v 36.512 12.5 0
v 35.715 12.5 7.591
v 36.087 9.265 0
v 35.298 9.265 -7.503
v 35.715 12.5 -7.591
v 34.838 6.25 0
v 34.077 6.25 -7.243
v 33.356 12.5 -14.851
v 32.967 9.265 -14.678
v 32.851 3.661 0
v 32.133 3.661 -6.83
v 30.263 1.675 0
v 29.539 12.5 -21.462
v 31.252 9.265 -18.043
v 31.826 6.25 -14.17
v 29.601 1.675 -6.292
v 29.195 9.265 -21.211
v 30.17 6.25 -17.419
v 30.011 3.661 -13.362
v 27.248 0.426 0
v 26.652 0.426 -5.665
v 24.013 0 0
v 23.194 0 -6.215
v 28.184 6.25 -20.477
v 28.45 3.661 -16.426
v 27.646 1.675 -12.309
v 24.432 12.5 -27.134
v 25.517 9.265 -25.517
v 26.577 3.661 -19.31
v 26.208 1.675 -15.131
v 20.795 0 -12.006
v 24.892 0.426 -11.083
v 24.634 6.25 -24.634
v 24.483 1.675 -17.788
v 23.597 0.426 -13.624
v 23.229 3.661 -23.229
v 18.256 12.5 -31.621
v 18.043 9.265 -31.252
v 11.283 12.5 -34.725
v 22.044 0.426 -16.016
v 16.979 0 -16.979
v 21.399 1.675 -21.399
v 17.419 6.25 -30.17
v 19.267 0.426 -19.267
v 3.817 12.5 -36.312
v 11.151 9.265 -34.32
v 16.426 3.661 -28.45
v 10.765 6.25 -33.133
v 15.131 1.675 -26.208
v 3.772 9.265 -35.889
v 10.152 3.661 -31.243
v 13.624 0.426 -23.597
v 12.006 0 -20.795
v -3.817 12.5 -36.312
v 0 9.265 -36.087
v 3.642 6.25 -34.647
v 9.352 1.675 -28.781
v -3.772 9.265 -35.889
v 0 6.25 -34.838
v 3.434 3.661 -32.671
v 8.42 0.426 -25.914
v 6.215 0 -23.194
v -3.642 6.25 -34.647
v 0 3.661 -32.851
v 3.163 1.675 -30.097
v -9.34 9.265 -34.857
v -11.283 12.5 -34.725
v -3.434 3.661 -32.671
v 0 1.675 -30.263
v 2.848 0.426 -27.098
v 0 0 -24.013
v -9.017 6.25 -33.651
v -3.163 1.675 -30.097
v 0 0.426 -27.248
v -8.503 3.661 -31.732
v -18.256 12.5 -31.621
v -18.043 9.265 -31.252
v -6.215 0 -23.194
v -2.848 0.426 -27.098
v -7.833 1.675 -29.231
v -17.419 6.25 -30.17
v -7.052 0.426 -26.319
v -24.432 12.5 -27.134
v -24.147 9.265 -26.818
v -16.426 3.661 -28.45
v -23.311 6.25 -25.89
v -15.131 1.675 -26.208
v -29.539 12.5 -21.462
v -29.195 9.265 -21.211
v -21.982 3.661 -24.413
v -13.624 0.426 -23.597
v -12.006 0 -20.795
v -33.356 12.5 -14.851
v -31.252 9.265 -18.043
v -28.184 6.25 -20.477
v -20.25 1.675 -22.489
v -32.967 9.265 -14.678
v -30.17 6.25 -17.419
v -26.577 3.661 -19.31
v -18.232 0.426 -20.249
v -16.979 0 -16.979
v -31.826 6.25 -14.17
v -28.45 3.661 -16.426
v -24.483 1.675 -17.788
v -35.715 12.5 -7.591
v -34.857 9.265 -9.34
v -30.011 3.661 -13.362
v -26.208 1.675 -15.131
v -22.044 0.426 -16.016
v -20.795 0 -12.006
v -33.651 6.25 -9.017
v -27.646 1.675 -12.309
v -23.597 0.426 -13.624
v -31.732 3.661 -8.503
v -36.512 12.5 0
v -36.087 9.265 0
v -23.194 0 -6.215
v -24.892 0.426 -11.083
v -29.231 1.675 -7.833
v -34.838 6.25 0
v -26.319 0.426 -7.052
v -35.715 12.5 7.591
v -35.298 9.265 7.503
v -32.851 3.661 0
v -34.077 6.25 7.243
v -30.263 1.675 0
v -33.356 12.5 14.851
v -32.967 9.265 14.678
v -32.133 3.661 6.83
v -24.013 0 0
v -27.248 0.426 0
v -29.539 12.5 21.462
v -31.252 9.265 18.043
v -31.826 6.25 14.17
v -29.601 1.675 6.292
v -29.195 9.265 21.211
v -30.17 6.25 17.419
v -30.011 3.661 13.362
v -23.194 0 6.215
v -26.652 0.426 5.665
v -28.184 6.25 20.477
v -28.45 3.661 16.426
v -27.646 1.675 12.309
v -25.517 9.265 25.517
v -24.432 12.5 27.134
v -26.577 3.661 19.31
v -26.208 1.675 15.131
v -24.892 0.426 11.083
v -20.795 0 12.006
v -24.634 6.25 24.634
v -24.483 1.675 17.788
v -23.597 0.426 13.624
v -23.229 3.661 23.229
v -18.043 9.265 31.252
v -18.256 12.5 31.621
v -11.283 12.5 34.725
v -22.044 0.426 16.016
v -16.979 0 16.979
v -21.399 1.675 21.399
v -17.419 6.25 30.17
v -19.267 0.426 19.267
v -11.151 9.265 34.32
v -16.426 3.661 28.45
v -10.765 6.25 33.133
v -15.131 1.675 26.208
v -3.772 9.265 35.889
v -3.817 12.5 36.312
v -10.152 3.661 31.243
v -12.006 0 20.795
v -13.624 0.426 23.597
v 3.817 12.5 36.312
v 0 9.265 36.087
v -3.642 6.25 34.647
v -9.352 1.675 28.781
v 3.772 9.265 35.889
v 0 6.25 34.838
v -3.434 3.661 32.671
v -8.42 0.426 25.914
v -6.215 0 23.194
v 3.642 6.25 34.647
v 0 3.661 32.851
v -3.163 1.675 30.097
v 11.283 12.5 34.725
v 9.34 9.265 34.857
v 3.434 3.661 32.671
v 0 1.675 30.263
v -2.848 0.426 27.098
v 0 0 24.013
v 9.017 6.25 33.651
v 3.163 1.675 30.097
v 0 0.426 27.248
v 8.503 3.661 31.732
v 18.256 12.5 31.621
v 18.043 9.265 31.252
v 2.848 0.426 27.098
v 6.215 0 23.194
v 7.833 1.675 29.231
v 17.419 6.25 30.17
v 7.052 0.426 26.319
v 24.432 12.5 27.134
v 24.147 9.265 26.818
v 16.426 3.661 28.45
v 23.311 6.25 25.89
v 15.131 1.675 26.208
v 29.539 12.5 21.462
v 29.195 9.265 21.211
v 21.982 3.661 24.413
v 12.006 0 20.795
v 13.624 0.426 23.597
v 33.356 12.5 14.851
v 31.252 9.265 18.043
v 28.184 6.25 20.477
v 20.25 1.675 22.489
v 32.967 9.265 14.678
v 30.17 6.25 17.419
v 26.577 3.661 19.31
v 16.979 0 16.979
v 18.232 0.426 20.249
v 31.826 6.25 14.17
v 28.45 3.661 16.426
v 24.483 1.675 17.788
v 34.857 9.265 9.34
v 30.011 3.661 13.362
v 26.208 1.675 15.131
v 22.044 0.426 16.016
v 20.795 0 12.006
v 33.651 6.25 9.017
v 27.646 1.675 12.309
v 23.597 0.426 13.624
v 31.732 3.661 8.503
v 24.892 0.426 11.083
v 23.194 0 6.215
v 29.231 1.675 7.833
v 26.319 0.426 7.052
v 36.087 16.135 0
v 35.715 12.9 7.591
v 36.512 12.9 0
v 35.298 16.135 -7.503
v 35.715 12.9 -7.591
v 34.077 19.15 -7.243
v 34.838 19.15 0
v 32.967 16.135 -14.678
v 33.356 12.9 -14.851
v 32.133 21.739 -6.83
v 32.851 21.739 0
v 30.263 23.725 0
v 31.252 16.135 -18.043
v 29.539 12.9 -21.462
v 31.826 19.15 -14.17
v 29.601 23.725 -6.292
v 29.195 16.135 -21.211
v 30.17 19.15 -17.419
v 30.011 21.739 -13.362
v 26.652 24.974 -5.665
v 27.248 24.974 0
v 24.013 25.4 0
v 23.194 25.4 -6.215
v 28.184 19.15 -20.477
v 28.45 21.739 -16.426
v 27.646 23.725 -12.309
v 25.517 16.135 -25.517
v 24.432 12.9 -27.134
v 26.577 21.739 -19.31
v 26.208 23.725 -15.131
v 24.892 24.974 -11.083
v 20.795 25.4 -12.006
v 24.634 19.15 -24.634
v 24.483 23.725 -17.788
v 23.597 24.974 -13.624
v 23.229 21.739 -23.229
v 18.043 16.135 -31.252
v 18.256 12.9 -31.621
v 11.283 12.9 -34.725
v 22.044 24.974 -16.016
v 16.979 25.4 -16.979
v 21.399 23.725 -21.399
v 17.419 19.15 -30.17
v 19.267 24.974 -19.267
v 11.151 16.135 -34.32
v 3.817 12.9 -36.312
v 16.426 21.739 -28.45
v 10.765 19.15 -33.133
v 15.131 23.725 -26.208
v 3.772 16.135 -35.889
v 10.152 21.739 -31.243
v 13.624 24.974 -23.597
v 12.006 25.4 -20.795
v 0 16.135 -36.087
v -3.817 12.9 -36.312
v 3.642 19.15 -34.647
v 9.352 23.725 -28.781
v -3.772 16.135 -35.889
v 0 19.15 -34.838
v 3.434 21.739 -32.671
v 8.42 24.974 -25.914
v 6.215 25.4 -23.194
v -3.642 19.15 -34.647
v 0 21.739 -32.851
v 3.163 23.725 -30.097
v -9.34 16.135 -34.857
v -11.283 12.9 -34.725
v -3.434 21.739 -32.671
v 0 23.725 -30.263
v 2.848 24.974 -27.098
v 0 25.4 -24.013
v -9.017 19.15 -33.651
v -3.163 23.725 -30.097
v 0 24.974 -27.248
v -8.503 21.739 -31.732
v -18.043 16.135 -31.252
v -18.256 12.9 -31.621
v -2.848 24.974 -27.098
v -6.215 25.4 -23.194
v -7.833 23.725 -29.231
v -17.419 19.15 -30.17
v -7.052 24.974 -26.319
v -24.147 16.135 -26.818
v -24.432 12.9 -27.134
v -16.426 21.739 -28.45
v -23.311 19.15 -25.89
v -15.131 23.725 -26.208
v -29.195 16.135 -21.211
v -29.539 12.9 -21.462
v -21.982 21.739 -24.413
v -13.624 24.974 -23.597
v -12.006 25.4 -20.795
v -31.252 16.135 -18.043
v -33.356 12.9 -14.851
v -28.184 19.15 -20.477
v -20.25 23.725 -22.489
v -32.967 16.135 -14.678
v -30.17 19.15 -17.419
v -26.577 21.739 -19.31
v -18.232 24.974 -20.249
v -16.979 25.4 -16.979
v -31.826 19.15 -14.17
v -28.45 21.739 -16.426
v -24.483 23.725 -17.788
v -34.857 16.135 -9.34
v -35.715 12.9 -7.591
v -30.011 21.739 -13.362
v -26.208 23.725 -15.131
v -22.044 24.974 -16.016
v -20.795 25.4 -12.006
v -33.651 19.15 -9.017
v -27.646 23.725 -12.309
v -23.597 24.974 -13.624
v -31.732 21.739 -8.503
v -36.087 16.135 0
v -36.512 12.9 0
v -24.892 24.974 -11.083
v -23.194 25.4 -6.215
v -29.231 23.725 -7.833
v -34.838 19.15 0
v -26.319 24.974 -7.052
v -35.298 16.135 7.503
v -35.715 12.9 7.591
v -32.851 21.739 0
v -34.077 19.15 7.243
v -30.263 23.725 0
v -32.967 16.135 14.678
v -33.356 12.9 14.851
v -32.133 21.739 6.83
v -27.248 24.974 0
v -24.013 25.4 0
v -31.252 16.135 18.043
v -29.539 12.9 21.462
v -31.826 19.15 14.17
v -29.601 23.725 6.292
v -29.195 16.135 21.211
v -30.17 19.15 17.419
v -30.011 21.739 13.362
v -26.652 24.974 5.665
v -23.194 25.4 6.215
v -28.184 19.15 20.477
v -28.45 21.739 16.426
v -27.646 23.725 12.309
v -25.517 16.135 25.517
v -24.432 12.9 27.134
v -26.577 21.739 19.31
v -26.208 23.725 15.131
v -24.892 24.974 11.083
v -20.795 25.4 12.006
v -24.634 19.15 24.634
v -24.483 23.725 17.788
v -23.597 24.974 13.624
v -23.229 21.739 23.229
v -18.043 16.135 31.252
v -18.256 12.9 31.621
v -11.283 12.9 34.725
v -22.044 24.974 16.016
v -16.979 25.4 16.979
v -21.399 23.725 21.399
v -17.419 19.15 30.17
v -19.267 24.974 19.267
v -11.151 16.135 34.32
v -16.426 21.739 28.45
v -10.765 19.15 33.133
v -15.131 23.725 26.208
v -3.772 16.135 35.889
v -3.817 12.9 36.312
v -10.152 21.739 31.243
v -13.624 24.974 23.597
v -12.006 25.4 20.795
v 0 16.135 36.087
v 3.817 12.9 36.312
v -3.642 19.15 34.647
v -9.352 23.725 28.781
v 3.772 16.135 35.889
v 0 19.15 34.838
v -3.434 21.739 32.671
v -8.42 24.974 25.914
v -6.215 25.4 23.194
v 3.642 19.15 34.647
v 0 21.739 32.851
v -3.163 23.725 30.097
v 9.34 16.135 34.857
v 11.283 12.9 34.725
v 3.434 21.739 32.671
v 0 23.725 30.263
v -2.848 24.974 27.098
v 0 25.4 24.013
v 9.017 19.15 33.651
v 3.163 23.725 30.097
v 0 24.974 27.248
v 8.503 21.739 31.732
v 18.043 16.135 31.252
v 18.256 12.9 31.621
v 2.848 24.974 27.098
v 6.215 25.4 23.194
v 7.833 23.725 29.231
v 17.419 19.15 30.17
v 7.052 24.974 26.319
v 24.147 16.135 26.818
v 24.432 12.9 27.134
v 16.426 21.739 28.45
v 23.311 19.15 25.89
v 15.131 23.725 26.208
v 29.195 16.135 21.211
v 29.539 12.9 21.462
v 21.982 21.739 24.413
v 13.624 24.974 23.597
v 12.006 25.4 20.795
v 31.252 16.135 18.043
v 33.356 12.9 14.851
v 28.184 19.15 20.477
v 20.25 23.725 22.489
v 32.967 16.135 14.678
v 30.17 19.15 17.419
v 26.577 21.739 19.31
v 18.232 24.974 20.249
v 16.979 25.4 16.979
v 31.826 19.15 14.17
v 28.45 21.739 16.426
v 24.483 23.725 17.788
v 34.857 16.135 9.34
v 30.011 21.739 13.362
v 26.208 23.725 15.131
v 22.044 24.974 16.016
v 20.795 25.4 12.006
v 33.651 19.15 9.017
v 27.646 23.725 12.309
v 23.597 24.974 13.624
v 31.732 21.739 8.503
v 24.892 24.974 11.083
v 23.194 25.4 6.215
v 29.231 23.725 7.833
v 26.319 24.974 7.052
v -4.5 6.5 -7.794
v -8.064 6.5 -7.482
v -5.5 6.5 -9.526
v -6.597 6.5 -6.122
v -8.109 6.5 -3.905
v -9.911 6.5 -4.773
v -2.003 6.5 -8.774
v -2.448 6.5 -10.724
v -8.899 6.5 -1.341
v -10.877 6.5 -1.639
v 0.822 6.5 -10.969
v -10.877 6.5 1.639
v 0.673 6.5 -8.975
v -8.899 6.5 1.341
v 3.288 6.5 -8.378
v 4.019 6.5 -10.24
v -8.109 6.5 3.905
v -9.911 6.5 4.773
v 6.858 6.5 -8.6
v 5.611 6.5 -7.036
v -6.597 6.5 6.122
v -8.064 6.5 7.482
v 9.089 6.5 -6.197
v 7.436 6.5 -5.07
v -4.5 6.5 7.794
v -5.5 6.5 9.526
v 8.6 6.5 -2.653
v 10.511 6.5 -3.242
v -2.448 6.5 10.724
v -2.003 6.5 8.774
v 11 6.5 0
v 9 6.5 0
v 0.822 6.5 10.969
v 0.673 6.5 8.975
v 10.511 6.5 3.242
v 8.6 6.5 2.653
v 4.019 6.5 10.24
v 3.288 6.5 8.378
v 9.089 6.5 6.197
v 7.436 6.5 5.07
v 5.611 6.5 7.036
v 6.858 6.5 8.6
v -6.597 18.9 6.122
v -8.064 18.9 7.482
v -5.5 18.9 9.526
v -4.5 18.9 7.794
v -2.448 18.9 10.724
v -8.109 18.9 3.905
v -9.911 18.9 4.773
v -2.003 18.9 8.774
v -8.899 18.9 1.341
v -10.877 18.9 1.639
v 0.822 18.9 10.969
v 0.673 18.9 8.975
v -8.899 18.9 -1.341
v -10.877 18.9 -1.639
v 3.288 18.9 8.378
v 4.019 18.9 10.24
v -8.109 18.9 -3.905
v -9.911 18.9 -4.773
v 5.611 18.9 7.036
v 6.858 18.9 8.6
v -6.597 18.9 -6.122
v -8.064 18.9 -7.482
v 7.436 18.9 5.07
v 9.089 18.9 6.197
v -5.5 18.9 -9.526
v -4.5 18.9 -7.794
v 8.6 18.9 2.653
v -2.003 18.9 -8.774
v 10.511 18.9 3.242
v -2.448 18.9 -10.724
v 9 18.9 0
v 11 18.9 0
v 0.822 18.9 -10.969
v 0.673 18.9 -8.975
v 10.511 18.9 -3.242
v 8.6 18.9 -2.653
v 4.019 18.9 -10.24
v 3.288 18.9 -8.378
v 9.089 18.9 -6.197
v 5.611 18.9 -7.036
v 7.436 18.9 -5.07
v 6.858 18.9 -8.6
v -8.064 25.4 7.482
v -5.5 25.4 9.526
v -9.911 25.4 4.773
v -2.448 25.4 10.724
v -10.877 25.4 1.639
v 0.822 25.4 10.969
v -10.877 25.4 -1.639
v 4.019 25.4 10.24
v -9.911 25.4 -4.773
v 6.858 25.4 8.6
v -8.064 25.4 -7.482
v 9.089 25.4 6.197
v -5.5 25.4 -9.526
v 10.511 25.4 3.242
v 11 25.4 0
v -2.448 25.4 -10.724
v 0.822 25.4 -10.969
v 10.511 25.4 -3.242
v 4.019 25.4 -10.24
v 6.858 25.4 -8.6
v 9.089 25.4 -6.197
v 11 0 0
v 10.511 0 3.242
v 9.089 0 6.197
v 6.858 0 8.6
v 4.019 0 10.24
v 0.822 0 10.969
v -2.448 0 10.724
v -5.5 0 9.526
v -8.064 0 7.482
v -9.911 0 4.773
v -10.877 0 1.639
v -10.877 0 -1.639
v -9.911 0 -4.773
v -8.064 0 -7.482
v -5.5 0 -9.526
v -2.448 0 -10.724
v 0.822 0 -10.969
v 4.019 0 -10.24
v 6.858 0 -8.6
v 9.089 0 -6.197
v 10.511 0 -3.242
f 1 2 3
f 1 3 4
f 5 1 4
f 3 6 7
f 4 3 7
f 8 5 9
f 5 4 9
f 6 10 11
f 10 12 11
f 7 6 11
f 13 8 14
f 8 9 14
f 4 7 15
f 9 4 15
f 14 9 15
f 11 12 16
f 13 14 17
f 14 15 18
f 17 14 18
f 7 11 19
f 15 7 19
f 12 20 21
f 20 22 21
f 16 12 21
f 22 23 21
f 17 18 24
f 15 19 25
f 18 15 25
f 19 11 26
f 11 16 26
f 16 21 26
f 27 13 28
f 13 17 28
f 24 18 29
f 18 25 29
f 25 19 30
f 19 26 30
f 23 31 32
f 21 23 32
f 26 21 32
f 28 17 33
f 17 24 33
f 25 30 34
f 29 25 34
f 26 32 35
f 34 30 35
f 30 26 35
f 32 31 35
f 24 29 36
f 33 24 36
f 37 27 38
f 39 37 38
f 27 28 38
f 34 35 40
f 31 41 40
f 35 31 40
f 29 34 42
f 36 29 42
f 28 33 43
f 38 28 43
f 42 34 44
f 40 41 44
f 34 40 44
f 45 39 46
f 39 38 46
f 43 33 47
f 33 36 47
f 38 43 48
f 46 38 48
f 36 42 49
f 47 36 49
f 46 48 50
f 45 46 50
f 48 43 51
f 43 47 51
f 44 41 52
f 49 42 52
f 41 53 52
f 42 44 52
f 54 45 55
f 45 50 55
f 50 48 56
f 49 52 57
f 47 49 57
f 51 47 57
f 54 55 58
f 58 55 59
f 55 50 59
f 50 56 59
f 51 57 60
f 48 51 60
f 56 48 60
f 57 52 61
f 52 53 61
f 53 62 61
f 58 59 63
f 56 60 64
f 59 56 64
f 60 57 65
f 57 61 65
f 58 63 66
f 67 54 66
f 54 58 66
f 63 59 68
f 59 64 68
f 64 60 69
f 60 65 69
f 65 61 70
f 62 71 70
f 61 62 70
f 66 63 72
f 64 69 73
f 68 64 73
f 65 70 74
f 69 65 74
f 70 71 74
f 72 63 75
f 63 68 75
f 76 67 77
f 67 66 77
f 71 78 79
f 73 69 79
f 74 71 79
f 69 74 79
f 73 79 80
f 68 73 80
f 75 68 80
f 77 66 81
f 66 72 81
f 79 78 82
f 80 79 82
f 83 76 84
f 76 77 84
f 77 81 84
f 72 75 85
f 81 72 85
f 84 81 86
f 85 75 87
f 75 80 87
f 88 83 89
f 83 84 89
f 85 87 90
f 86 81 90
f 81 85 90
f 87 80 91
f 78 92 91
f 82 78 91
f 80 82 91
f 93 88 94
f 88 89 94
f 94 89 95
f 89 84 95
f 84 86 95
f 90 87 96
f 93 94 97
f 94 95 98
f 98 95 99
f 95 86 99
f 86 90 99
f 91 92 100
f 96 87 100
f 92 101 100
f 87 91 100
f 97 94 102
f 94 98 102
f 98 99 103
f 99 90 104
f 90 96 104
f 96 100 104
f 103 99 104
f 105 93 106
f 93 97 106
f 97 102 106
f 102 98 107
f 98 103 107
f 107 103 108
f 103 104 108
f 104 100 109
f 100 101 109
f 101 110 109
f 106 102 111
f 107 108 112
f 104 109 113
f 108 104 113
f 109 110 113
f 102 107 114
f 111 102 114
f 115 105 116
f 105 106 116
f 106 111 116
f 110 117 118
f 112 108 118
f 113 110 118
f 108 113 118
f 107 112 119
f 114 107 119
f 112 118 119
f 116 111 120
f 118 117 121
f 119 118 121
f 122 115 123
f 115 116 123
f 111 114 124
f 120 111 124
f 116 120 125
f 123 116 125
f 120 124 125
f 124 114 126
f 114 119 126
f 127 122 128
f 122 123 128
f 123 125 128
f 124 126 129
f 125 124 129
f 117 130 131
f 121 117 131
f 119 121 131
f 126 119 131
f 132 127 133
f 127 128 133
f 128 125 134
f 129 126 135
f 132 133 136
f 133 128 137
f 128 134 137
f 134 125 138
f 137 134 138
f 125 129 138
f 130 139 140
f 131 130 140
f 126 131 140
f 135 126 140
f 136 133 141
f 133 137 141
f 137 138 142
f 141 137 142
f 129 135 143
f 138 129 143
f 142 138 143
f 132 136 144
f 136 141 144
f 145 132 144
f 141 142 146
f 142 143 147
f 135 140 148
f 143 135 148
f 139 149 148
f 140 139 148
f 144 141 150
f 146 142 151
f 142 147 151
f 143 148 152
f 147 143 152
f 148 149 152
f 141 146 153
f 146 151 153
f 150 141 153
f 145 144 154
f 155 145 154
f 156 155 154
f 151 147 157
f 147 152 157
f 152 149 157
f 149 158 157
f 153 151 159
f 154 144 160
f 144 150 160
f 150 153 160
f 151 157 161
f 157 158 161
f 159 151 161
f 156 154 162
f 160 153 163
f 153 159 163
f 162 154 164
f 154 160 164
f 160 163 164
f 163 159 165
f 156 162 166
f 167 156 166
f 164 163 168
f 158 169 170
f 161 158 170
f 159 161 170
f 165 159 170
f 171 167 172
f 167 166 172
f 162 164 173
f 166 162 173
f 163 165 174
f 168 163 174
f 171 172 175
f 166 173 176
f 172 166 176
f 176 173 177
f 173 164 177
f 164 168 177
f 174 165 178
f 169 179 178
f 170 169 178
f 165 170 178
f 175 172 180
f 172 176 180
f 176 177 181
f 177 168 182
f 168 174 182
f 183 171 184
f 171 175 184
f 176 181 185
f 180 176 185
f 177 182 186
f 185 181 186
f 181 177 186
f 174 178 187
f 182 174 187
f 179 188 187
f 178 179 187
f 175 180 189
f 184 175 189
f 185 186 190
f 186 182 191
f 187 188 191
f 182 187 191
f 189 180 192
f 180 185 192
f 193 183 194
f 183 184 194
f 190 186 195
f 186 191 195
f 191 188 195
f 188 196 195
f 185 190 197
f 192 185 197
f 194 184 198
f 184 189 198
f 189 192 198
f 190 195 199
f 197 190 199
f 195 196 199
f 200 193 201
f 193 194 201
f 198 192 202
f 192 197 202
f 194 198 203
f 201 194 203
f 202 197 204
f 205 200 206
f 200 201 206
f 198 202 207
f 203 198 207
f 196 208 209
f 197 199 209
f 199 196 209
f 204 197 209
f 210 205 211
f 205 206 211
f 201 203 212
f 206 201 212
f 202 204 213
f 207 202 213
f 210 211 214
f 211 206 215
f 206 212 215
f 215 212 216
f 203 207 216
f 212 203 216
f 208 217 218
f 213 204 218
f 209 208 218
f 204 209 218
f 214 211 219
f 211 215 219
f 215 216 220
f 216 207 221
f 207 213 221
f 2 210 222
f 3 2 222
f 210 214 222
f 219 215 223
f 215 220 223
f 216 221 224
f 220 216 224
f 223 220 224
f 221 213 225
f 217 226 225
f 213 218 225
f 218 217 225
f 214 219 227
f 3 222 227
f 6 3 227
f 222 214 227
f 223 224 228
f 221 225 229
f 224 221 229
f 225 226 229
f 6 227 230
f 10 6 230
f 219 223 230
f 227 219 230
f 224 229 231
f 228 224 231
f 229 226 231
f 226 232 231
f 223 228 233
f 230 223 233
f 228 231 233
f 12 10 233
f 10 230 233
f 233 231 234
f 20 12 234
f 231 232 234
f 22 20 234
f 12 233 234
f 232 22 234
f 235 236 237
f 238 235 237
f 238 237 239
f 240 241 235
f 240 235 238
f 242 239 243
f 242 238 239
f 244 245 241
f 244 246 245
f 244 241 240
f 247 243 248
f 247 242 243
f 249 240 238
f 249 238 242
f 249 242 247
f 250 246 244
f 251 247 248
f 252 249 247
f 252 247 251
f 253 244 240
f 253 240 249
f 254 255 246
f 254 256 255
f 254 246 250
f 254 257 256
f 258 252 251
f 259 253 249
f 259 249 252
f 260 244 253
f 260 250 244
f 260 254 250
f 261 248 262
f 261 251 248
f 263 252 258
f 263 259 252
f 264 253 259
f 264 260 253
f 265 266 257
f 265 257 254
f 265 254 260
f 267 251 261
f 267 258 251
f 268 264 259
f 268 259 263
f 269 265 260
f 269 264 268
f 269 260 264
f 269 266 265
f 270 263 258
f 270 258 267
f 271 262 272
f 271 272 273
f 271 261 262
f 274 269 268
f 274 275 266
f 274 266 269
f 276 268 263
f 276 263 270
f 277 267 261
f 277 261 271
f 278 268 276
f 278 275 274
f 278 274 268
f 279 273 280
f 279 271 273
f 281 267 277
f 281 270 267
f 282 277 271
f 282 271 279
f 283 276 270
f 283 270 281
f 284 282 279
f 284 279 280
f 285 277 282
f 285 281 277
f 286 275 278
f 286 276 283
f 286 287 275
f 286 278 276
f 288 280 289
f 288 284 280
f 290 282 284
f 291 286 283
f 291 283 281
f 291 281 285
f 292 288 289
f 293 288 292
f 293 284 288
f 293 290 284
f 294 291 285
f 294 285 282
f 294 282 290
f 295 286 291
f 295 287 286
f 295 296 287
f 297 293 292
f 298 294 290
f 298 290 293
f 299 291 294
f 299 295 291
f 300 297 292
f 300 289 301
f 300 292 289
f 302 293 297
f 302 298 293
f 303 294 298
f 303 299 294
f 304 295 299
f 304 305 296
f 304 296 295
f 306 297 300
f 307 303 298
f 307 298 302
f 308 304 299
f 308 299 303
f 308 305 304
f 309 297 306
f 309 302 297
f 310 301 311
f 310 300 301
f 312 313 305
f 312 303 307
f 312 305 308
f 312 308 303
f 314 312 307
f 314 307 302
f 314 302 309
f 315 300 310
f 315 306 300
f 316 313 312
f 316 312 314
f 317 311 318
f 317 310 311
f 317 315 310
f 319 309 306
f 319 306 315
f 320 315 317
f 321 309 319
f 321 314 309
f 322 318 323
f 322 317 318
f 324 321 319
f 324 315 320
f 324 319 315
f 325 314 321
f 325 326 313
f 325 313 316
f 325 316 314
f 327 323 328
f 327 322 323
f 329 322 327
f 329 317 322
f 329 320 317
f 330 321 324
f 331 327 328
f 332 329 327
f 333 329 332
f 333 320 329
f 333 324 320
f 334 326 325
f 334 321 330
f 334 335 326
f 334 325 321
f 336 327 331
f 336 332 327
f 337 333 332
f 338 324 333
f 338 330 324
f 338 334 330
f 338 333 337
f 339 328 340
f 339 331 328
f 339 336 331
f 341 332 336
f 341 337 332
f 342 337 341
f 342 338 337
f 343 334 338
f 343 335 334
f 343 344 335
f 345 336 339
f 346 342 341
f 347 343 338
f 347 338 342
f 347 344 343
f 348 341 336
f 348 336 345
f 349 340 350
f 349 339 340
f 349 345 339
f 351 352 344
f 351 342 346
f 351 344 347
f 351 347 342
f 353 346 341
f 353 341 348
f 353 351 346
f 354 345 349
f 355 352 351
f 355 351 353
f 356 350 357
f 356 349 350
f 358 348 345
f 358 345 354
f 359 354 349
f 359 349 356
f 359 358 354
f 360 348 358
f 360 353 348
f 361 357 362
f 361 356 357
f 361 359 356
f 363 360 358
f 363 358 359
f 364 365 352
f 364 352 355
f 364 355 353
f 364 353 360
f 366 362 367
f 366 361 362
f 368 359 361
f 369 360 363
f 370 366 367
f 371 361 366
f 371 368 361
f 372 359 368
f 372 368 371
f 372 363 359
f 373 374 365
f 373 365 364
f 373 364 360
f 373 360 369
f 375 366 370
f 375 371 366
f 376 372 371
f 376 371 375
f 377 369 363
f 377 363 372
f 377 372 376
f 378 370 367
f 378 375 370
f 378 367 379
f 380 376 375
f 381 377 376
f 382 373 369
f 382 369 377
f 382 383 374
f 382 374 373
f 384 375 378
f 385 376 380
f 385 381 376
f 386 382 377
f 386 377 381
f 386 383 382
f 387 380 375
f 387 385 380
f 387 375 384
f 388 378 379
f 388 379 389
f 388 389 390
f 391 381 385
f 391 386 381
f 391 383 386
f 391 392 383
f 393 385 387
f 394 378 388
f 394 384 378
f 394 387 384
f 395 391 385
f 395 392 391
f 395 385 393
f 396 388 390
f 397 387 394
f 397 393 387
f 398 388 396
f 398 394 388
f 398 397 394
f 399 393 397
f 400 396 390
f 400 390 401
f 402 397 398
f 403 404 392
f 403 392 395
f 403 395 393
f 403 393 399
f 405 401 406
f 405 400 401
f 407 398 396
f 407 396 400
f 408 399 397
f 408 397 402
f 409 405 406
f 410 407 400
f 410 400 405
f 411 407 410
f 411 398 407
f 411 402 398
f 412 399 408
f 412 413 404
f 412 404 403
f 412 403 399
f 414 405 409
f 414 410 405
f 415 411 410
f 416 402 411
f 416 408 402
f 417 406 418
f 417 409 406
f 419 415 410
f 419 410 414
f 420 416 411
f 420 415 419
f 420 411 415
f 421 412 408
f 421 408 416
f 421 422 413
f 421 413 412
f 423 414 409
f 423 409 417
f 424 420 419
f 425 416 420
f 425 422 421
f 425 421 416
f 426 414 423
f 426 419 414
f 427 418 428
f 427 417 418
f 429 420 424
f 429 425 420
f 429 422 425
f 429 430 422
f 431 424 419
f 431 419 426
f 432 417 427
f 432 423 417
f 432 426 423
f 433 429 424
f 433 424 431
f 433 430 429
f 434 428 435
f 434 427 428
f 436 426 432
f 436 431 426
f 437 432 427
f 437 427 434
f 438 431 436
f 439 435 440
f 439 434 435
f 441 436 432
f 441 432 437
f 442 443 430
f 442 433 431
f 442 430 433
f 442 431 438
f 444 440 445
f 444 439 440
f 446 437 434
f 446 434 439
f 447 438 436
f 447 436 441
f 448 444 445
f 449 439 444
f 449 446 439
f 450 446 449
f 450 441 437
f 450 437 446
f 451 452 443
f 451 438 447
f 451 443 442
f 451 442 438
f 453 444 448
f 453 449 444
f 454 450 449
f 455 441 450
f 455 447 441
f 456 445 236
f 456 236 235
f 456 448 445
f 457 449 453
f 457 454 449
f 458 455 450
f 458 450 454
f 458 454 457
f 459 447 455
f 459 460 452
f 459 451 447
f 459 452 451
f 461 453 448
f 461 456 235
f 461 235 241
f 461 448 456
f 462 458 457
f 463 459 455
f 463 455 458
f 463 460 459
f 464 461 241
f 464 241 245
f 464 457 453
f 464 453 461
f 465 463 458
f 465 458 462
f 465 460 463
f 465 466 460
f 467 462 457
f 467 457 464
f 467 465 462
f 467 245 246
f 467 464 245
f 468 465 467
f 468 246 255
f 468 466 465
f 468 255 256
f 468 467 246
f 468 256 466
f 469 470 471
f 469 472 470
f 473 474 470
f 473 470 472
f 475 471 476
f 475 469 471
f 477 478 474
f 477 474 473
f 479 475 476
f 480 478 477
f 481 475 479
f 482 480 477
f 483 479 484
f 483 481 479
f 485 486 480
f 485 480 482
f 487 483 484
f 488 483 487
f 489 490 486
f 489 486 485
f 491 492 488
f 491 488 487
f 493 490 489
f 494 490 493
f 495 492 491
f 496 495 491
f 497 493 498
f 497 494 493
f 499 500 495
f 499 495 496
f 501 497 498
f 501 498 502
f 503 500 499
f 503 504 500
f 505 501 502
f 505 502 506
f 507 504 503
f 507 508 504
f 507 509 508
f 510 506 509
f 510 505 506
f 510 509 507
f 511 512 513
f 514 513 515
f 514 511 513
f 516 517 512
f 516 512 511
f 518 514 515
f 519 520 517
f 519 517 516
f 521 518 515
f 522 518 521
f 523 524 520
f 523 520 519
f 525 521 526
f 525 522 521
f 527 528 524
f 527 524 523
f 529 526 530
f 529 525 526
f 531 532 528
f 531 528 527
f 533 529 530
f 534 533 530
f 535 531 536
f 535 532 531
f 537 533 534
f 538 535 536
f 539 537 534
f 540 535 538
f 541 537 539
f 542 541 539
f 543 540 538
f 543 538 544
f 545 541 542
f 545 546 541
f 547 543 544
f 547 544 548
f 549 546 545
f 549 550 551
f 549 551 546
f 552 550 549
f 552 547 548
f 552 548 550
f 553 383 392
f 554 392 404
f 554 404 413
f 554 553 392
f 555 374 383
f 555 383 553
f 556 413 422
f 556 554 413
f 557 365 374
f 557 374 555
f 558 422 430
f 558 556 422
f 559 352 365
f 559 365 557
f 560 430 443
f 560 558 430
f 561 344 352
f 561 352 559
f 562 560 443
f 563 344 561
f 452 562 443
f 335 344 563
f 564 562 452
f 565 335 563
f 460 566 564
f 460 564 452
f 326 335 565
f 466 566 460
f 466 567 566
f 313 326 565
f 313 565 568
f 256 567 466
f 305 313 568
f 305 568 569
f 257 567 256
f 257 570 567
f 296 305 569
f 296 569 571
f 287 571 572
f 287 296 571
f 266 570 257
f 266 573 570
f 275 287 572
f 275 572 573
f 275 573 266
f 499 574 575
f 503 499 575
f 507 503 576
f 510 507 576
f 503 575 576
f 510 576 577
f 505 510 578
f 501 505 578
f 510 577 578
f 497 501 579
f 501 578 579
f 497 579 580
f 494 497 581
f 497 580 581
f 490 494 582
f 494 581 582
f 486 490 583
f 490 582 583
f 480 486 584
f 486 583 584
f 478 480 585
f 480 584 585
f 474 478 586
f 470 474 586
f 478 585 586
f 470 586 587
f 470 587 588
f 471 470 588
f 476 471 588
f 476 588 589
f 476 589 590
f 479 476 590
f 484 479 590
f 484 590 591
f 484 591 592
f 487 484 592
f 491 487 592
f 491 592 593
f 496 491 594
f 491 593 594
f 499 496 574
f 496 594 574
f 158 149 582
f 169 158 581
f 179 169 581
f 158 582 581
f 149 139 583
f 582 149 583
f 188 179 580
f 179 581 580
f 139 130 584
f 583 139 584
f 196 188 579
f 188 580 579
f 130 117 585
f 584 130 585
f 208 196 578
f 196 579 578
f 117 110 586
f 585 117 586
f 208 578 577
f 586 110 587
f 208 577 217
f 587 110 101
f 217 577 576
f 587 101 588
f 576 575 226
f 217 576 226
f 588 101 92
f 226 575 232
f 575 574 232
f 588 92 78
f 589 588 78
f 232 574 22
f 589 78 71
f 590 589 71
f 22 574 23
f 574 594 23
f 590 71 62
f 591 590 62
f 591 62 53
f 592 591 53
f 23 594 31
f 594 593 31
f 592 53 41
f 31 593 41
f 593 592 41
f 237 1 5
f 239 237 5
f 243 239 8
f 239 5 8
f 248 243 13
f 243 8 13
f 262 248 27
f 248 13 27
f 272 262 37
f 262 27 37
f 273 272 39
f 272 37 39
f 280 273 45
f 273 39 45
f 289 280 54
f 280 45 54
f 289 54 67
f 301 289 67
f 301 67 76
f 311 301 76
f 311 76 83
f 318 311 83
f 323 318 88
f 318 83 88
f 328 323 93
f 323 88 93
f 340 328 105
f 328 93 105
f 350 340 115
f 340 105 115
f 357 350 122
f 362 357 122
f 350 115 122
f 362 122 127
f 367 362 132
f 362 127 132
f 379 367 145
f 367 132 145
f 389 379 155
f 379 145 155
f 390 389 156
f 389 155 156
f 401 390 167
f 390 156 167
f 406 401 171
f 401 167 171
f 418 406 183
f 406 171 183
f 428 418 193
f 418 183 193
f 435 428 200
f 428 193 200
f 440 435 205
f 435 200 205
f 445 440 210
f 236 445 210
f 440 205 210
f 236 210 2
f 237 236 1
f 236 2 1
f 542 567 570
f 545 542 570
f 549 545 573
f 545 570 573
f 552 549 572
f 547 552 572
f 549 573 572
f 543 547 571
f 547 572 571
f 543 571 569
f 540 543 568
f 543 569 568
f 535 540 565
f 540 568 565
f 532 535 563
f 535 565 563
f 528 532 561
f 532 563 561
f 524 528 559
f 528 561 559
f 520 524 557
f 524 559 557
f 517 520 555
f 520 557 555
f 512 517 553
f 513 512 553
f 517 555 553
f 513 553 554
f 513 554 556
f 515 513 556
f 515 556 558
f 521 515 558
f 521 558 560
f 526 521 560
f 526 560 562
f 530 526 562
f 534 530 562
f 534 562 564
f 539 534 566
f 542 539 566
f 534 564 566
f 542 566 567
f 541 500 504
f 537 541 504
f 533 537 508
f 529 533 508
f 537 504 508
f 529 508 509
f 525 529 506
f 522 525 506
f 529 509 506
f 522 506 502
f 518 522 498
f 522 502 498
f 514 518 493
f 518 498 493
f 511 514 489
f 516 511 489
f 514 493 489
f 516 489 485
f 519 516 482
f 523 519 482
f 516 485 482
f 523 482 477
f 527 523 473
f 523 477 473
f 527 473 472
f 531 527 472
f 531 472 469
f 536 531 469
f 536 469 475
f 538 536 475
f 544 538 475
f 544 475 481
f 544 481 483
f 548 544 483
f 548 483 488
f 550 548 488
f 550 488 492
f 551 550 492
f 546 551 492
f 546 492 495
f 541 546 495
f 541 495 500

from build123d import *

# Parameters (mm, degrees)
SKETCH1_R           = 36.5125
BOSS_EXTRUDE1_DEPTH = 25.4
FILLET1_R           = 12.5
SKETCH2_R           = 11
CUT_EXTRUDE1_DEPTH  = 6.5
SKETCH3_R           = 11
CUT_EXTRUDE2_DEPTH  = 6.5
SKETCH4_R           = 9
CUT_EXTRUDE3_DEPTH  = 19.9


with BuildPart() as part:
    # Sketch1 → Boss-Extrude1 (new body)
    with BuildSketch(Plane(origin=(0, 0, 0), x_dir=(1, 0, 0), z_dir=(0, 1, 0))):
        Circle(SKETCH1_R)
    extrude(amount=BOSS_EXTRUDE1_DEPTH)

    # Fillet1
    fillet1_edges = [part.edges().sort_by_distance(p)[0] for p in [
        (-36.5125, 0, 0),
        (-36.5125, 25.4, 0),
    ]]
    fillet(fillet1_edges, radius=FILLET1_R)

    # Sketch2 → Cut-Extrude1 (cut)
    with BuildSketch(Plane(origin=(0, 25.4, 0), x_dir=(1, 0, 0), z_dir=(0, 1, 0))):
        Circle(SKETCH2_R)
    extrude(amount=-CUT_EXTRUDE1_DEPTH, mode=Mode.SUBTRACT)

    # Sketch3 → Cut-Extrude2 (cut)
    with BuildSketch(Plane.XZ):
        Circle(SKETCH3_R)
    extrude(amount=-CUT_EXTRUDE2_DEPTH, mode=Mode.SUBTRACT)

    # Sketch4 → Cut-Extrude3 (cut, through all)
    with BuildSketch(Plane.XZ.offset(-6.5)):
        Circle(SKETCH4_R)
    extrude(amount=-CUT_EXTRUDE3_DEPTH, mode=Mode.SUBTRACT)


solid = part.part
